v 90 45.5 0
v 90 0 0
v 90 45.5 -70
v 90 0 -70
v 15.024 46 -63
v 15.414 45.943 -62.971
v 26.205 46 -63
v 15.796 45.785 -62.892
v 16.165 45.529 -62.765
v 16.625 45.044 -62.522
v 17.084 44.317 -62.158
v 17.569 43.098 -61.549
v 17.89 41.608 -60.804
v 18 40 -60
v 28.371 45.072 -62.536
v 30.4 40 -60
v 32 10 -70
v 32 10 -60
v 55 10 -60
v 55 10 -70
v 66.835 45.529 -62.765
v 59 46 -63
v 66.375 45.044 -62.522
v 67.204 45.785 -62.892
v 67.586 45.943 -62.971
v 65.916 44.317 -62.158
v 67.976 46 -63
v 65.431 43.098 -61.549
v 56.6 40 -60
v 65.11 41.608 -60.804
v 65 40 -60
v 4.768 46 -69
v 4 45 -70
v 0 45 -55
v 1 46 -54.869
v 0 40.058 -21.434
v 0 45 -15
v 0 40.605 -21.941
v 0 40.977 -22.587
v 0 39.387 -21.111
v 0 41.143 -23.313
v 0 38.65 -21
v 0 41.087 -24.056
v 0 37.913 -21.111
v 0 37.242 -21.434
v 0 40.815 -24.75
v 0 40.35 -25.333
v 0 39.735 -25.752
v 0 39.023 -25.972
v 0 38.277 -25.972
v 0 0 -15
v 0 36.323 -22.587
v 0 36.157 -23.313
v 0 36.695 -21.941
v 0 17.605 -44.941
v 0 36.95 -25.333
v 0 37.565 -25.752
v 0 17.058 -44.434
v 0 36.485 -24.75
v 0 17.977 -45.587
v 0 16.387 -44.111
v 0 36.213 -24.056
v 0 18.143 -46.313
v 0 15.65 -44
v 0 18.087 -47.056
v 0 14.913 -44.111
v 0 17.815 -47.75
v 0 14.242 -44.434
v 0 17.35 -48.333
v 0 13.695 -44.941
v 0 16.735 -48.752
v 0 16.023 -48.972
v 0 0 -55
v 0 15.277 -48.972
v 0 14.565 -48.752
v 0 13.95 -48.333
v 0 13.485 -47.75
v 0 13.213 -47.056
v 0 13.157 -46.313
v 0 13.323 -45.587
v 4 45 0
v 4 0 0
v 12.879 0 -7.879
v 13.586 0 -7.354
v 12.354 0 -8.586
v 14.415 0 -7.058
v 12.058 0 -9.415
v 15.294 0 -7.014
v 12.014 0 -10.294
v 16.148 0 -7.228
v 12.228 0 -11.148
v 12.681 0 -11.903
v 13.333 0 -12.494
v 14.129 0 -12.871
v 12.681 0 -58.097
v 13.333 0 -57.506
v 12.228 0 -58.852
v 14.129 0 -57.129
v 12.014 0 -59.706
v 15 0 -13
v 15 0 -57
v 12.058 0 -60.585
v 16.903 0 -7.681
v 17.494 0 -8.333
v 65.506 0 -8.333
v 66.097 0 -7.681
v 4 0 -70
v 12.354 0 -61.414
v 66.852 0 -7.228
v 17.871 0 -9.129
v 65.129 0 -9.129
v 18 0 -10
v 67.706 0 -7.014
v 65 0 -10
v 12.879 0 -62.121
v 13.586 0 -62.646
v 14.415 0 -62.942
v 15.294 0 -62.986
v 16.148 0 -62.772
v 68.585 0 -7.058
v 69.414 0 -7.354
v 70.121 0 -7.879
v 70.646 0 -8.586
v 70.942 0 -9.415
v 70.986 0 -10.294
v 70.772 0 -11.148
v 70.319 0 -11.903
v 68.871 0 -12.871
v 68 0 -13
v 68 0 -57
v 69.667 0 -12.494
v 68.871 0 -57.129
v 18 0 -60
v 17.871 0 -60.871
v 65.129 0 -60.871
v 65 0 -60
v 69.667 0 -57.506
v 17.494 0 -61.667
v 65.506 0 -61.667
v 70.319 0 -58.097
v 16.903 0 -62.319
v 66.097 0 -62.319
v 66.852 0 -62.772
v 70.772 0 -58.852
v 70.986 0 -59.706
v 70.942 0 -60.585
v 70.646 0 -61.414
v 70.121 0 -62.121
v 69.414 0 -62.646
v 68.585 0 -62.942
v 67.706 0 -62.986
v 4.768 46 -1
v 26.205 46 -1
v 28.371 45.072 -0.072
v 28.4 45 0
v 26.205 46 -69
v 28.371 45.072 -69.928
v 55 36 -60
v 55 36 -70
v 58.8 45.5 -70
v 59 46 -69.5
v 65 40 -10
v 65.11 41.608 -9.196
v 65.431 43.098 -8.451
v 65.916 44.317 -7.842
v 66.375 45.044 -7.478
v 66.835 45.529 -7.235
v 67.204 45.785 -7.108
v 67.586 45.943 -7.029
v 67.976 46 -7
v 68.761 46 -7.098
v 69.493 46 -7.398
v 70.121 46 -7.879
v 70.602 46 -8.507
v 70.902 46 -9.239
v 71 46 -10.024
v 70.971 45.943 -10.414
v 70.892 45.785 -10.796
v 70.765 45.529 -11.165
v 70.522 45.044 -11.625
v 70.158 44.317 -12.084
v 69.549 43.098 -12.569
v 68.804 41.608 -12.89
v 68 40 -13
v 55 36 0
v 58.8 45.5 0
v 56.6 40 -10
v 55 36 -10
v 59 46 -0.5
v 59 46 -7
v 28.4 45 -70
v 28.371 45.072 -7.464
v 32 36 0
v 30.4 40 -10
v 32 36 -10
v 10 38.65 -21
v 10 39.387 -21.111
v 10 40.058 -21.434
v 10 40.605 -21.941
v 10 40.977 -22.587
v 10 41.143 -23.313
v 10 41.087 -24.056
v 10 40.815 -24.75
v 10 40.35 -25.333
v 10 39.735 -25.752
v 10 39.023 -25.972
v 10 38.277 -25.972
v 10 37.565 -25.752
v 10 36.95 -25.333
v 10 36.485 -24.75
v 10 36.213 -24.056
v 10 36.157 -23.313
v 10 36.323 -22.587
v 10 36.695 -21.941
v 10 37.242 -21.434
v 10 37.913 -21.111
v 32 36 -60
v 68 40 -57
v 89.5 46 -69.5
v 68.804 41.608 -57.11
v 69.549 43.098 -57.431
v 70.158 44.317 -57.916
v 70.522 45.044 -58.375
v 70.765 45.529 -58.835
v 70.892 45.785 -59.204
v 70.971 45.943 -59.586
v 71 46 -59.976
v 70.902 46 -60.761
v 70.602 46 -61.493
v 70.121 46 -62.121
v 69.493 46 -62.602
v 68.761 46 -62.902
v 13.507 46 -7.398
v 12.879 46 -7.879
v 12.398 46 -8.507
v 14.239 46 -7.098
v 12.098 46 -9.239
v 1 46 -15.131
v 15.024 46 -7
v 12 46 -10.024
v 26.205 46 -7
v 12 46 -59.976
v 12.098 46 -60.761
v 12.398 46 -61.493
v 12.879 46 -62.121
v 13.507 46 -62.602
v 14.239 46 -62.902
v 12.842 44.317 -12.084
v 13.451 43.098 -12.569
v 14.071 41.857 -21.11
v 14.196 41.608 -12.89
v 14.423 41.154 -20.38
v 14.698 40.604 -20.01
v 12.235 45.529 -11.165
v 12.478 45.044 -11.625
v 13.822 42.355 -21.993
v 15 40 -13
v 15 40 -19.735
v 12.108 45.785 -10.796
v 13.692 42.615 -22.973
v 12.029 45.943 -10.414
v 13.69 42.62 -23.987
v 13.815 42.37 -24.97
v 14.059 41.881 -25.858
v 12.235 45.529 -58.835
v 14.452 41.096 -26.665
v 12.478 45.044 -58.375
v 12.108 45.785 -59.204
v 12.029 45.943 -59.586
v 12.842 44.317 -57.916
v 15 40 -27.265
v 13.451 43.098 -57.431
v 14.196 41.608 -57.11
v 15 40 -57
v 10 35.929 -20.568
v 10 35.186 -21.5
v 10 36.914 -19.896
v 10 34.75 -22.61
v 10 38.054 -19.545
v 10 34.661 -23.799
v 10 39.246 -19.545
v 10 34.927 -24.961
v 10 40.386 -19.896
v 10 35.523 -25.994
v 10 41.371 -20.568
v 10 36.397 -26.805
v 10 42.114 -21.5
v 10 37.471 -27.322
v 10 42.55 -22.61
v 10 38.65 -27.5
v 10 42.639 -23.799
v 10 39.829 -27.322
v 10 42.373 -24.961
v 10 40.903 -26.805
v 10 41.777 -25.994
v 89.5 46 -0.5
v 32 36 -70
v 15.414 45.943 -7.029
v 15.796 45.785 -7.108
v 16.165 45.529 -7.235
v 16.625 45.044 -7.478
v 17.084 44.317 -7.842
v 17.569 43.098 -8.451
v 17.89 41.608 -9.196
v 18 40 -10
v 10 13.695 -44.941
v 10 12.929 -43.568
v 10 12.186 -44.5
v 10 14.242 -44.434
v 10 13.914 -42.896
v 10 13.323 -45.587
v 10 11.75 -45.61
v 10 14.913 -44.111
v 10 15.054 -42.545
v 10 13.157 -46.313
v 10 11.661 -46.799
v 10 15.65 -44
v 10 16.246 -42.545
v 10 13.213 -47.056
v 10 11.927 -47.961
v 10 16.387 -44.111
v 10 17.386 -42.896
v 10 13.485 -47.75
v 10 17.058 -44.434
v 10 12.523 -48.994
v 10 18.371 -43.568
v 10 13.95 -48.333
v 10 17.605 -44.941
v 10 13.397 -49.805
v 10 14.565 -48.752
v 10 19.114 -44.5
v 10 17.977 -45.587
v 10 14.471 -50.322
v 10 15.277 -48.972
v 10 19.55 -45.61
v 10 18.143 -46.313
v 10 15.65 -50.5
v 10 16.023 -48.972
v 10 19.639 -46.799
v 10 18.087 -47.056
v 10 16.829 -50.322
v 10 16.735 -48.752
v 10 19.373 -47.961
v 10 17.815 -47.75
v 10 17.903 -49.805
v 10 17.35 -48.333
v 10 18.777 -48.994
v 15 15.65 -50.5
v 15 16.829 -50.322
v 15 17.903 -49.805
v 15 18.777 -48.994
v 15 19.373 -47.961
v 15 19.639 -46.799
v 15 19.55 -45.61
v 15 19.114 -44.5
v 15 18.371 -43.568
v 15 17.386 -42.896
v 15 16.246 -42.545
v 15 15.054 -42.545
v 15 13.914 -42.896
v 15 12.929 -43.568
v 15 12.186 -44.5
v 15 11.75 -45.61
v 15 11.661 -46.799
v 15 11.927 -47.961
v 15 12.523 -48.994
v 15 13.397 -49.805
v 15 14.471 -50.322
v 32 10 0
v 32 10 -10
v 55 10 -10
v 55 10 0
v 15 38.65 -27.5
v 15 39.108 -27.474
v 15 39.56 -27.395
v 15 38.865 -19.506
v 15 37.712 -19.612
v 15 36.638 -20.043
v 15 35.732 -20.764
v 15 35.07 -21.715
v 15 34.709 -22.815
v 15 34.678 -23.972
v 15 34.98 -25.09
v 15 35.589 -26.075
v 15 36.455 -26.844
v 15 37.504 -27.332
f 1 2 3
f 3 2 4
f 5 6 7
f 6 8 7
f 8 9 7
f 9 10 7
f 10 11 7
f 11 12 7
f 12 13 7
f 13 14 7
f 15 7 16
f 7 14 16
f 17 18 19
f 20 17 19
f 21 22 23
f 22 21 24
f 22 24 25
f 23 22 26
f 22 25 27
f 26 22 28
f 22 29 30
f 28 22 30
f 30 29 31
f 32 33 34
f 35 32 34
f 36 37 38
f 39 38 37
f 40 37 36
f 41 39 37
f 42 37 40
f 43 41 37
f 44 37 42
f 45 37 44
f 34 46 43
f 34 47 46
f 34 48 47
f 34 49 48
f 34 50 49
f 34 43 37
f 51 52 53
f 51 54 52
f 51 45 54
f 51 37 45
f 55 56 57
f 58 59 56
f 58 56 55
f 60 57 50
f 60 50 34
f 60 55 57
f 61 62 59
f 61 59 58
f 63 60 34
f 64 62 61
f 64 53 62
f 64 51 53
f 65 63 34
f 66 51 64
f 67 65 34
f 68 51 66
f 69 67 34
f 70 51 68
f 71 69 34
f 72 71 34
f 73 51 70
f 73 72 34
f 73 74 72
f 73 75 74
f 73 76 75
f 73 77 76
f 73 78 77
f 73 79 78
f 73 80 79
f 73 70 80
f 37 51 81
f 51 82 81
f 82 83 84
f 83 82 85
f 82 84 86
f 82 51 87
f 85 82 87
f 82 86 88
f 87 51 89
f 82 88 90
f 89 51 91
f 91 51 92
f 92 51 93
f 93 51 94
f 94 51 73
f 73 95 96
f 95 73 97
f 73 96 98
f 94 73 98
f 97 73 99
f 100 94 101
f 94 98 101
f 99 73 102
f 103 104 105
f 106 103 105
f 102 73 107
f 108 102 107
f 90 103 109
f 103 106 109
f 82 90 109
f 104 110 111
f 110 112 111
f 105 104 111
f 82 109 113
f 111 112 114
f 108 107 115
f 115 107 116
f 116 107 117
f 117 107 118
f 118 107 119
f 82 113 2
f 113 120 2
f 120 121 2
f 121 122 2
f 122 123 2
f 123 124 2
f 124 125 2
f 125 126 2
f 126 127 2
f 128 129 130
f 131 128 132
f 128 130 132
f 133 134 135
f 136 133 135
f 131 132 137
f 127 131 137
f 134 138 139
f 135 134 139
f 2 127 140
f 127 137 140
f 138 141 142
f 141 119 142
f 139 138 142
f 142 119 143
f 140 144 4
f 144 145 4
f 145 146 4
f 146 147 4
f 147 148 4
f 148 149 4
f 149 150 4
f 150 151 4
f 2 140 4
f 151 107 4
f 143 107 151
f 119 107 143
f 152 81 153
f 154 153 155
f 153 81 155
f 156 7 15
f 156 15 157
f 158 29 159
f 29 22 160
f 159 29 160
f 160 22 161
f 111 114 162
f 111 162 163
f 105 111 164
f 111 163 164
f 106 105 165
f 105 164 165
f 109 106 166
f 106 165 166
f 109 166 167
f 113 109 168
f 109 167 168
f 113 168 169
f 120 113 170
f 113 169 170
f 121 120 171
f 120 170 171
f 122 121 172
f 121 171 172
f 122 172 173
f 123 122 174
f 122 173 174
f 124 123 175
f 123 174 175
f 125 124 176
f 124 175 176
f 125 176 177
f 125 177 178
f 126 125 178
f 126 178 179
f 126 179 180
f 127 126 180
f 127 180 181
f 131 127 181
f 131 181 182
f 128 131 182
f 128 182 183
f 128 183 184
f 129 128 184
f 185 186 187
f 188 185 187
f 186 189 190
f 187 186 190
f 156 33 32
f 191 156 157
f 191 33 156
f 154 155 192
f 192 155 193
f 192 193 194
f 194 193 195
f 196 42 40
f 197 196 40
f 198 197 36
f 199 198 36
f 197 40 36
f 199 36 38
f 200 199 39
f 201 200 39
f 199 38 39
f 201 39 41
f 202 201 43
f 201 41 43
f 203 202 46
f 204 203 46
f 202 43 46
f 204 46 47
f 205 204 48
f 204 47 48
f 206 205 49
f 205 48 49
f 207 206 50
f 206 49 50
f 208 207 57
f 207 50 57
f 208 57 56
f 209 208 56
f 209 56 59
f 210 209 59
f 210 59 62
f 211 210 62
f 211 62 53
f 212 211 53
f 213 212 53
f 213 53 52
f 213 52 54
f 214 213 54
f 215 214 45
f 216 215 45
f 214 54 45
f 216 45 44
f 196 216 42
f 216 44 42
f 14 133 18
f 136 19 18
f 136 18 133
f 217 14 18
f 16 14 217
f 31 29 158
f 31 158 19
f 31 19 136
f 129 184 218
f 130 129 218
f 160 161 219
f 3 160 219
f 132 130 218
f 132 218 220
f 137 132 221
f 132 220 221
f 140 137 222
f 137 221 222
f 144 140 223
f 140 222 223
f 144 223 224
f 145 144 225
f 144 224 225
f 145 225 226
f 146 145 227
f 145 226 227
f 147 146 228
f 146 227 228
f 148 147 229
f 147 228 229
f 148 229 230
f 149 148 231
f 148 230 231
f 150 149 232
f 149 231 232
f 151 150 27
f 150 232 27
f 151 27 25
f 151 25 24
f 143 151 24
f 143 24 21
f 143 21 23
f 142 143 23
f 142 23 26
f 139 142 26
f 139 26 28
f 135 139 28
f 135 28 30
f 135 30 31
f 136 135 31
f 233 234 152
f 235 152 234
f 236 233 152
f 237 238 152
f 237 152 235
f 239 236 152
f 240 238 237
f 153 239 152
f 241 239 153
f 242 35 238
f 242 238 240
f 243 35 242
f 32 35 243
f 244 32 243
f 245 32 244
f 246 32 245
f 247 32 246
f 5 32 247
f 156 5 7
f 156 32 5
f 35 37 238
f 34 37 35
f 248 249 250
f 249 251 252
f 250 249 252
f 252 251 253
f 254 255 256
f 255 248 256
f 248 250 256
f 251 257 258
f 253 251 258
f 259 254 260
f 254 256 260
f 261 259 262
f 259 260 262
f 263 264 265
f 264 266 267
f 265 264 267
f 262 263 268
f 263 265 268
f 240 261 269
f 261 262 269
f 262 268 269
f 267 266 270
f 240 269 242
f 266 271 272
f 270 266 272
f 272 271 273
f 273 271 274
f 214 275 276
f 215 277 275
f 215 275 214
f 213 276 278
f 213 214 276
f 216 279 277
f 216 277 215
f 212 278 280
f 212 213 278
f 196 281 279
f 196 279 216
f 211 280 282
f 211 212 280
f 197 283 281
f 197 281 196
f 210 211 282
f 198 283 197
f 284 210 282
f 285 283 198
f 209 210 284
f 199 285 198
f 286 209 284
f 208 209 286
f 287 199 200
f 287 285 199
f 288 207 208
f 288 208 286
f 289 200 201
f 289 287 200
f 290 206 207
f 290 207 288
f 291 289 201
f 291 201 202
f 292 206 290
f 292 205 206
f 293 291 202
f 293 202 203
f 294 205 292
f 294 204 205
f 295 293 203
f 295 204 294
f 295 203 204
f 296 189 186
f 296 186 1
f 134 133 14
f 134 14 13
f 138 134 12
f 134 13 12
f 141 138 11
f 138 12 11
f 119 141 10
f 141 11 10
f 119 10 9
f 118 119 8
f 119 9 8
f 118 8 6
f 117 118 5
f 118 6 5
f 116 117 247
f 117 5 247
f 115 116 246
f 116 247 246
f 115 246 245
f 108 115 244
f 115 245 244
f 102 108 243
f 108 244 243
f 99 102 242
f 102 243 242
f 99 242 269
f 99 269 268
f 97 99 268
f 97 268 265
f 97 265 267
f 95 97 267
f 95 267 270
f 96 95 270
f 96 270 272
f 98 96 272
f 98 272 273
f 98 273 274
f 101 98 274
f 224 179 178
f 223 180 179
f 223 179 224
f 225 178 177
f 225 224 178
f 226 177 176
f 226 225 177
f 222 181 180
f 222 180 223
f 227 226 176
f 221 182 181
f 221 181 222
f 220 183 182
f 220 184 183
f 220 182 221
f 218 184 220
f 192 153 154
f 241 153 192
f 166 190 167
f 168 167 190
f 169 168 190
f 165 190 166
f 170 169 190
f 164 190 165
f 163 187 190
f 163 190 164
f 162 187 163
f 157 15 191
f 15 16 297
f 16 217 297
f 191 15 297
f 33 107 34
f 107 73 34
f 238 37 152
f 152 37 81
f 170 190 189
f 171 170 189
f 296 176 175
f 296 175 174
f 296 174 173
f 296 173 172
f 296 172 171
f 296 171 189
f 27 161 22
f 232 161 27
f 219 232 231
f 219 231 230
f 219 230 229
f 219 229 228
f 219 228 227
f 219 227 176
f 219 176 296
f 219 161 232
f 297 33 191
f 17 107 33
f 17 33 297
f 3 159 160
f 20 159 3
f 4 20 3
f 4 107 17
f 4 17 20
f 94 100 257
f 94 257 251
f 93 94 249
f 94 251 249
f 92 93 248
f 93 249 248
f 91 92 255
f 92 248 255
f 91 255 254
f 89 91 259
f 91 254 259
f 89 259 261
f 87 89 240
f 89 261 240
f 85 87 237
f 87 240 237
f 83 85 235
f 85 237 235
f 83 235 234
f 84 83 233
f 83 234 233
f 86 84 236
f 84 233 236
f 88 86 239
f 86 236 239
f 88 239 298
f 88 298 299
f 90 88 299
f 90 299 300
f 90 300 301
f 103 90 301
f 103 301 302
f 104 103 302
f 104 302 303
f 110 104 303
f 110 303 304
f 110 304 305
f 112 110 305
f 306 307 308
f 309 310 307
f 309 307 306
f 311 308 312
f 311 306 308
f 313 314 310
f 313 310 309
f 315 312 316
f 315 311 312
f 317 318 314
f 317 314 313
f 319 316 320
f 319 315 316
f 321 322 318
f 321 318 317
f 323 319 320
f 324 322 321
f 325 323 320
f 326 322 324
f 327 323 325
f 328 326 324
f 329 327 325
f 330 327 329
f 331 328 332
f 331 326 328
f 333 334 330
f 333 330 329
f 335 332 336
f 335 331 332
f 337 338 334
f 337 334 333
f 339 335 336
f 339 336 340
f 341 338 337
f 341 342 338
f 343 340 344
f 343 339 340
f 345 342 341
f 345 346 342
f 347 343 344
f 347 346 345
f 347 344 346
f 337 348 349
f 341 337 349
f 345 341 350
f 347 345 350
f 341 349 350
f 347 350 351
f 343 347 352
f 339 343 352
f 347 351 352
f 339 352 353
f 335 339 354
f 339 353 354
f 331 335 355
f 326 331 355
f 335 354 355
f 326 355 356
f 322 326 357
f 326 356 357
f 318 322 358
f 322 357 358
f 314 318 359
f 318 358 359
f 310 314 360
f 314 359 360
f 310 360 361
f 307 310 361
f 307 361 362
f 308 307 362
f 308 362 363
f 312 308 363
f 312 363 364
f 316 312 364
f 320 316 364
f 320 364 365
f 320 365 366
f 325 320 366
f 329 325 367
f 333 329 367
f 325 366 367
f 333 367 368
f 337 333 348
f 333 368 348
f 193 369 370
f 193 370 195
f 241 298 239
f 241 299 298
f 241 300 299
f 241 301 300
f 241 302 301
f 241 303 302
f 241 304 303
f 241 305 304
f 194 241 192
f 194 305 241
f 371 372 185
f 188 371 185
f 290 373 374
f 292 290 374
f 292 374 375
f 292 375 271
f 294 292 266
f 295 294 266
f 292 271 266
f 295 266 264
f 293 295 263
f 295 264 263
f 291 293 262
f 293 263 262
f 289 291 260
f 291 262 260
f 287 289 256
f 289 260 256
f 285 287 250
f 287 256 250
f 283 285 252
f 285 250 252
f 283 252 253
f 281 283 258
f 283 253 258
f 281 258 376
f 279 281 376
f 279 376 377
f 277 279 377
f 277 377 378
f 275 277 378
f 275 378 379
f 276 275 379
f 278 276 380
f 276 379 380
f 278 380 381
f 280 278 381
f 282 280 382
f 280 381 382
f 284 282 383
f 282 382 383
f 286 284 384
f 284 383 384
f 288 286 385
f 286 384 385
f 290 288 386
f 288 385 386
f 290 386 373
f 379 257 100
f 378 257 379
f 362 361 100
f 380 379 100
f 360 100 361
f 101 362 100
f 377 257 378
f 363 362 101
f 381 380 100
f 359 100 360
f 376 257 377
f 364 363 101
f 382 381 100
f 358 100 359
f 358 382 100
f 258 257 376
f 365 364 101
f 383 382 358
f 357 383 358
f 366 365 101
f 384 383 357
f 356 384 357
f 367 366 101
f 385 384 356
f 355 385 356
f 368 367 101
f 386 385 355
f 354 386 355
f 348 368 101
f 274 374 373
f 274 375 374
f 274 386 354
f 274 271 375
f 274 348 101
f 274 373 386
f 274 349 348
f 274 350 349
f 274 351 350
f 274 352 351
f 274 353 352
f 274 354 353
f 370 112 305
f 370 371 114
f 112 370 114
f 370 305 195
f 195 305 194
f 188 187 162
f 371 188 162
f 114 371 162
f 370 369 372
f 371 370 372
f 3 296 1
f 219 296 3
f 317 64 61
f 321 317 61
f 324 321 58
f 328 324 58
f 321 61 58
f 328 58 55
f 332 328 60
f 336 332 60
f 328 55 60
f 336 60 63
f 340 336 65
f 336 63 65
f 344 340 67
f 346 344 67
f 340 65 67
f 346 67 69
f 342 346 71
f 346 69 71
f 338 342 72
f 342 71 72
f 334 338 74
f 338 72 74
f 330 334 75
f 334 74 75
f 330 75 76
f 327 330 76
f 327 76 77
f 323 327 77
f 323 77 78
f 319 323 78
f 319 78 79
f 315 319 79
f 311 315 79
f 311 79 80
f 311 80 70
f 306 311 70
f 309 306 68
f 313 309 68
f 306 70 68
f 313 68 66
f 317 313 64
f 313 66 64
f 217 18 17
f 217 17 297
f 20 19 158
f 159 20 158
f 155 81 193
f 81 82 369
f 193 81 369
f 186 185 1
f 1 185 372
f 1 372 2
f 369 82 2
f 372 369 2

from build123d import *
from OCP.BRepFilletAPI import BRepFilletAPI_MakeChamfer

# Parameters (mm, degrees)
SKETCH1_W           = 90
SKETCH1_H           = 70
BOSS_EXTRUDE1_DEPTH = 46
SKETCH2_W           = 53
SKETCH2_H           = 50
CUT_EXTRUDE1_DEPTH  = 123.947143114
SKETCH3_R           = 3
CUT_EXTRUDE2_DEPTH  = 123.947143114
SKETCH4_W           = 23
SKETCH4_H           = 36
CUT_EXTRUDE3_DEPTH  = 123.947143114
CHAMFER1_SIZE       = 10
CHAMFER1_SIZE2      = 4
CHAMFER2_SIZE       = 4
CHAMFER2_SIZE2      = 10
CHAMFER3_SIZE       = 3
CHAMFER3_SIZE_2     = 6
CHAMFER4_SIZE       = 4
CHAMFER4_SIZE2      = 15
CHAMFER5_SIZE       = 15
CHAMFER5_SIZE2      = 4
CHAMFER6_SIZE       = 1
CHAMFER6_SIZE2      = 1.795054936
CHAMFER7_SIZE       = 0.5
SKETCH5_R           = 2.5
CUT_EXTRUDE4_DEPTH  = 10
SKETCH7_R           = 4
CUT_EXTRUDE5_DEPTH  = 5


with BuildPart() as part:
    # Sketch1 → Boss-Extrude1 (new body)
    with BuildSketch(Plane(origin=(0, 0, 0), x_dir=(1, 0, 0), z_dir=(0, 1, 0))):
        with Locations((45, 35)):
            Rectangle(SKETCH1_W, SKETCH1_H)
    extrude(amount=BOSS_EXTRUDE1_DEPTH)

    # Sketch2 → Cut-Extrude1 (cut, through all)
    with BuildSketch(Plane(origin=(0, 46, 0), x_dir=(1, 0, 0), z_dir=(0, 1, 0))):
        with Locations((41.5, 35)):
            Rectangle(SKETCH2_W, SKETCH2_H)
    extrude(amount=-CUT_EXTRUDE1_DEPTH, mode=Mode.SUBTRACT)

    # Sketch3 → Cut-Extrude2 (cut, through all)
    with BuildSketch(Plane(origin=(0, 46, 0), x_dir=(1, 0, 0), z_dir=(0, 1, 0))):
        with Locations((15, 60)):
            Circle(SKETCH3_R)
        with Locations((68, 60)):
            Circle(SKETCH3_R)
        with Locations((68, 10)):
            Circle(SKETCH3_R)
        with Locations((15, 10)):
            Circle(SKETCH3_R)
    extrude(amount=-CUT_EXTRUDE2_DEPTH, mode=Mode.SUBTRACT)

    # Sketch4 → Cut-Extrude3 (cut, through all)
    with BuildSketch(Plane.XY):
        with Locations((43.5, 28)):
            Rectangle(SKETCH4_W, SKETCH4_H)
    extrude(amount=-CUT_EXTRUDE3_DEPTH, mode=Mode.SUBTRACT)

    # Chamfer1: one chamfer whose edges measure the first distance from different faces: ONE call of the kernel's chamfer builder (chamfer() names one face for all edges)
    chamfer1_edges_1 = [part.edges().sort_by_distance(p)[0] for p in [
        (55, 46, -65),
    ]]
    chamfer1_side_1 = [part.faces().sort_by_distance(p)[0] for p in [
        (55, 28, -65),
    ]]
    chamfer1_edges_2 = [part.edges().sort_by_distance(p)[0] for p in [
        (55, 46, -5),
    ]]
    chamfer1_side_2 = [part.faces().sort_by_distance(p)[0] for p in [
        (55, 28, -5),
    ]]
    chamfer1 = BRepFilletAPI_MakeChamfer(part.part.solid().wrapped)
    for e in chamfer1_edges_1:
        chamfer1.Add(CHAMFER1_SIZE, CHAMFER1_SIZE2, e.wrapped, chamfer1_side_1[0].wrapped)  # the first distance lies on this face
    for e in chamfer1_edges_2:
        chamfer1.Add(CHAMFER1_SIZE, CHAMFER1_SIZE2, e.wrapped, chamfer1_side_2[0].wrapped)  # the first distance lies on this face
    add(Compound.cast(chamfer1.Shape()), mode=Mode.REPLACE)

    # Chamfer2
    chamfer2_edges = [part.edges().sort_by_distance(p)[0] for p in [
        (32, 46, -65),
        (32, 46, -5),
    ]]
    chamfer2_side = [part.faces().sort_by_distance(p)[0] for p in [
        (11.31415673, 46, -35),
    ]]
    chamfer(chamfer2_edges, length=CHAMFER2_SIZE, length2=CHAMFER2_SIZE2, reference=chamfer2_side[0])

    # Chamfer3
    chamfer3_edges_1 = [part.edges().sort_by_distance(p)[0] for p in [
        (62, 46, -10),
    ]]
    chamfer3_side_1 = [part.faces().sort_by_distance(p)[0] for p in [
        (62, 46, -9.94),
    ]]
    chamfer3_edges_2 = [part.edges().sort_by_distance(p)[0] for p in [
        (68, 46, -35),
    ]]
    chamfer3_side_2 = [part.faces().sort_by_distance(p)[0] for p in [
        (68.06, 46, -35),
    ]]
    chamfer3_edges_3 = [part.edges().sort_by_distance(p)[0] for p in [
        (62, 46, -60),
    ]]
    chamfer3_side_3 = [part.faces().sort_by_distance(p)[0] for p in [
        (62, 46, -60.06),
    ]]
    chamfer3_edges_4 = [part.edges().sort_by_distance(p)[0] for p in [
        (23, 46, -60),
    ]]
    chamfer3_side_4 = [part.faces().sort_by_distance(p)[0] for p in [
        (23, 46, -60.06),
    ]]
    chamfer3_edges_5 = [part.edges().sort_by_distance(p)[0] for p in [
        (23, 46, -10),
    ]]
    chamfer3_side_5 = [part.faces().sort_by_distance(p)[0] for p in [
        (23, 46, -9.94),
    ]]
    chamfer3_edges_6 = [part.edges().sort_by_distance(p)[0] for p in [
        (15, 46, -35),
    ]]
    chamfer3_side_6 = [part.faces().sort_by_distance(p)[0] for p in [
        (14.94, 46, -35),
    ]]
    chamfer3 = BRepFilletAPI_MakeChamfer(part.part.solid().wrapped)
    for e in chamfer3_edges_1:
        chamfer3.Add(CHAMFER3_SIZE - 0.0001, CHAMFER3_SIZE_2 - 0.0001, e.wrapped, chamfer3_side_1[0].wrapped)
    for e in chamfer3_edges_2:
        chamfer3.Add(CHAMFER3_SIZE - 0.0001, CHAMFER3_SIZE_2 - 0.0001, e.wrapped, chamfer3_side_2[0].wrapped)
    for e in chamfer3_edges_3:
        chamfer3.Add(CHAMFER3_SIZE - 0.0001, CHAMFER3_SIZE_2 - 0.0001, e.wrapped, chamfer3_side_3[0].wrapped)
    for e in chamfer3_edges_4:
        chamfer3.Add(CHAMFER3_SIZE - 0.0001, CHAMFER3_SIZE_2 - 0.0001, e.wrapped, chamfer3_side_4[0].wrapped)
    for e in chamfer3_edges_5:
        chamfer3.Add(CHAMFER3_SIZE - 0.0001, CHAMFER3_SIZE_2 - 0.0001, e.wrapped, chamfer3_side_5[0].wrapped)
    for e in chamfer3_edges_6:
        chamfer3.Add(CHAMFER3_SIZE - 0.0001, CHAMFER3_SIZE_2 - 0.0001, e.wrapped, chamfer3_side_6[0].wrapped)
    add(Compound.cast(chamfer3.Shape()), mode=Mode.REPLACE)  # a hair under: the kernel refuses the full size

    # Chamfer4
    chamfer4_edges = [part.edges().sort_by_distance(p)[0] for p in [
        (0, 23, -70),
    ]]
    chamfer4_side = [part.faces().sort_by_distance(p)[0] for p in [
        (30.989257699, 23, -70),
    ]]
    chamfer(chamfer4_edges, length=CHAMFER4_SIZE, length2=CHAMFER4_SIZE2, reference=chamfer4_side[0])

    # Chamfer5
    chamfer5_edges = [part.edges().sort_by_distance(p)[0] for p in [
        (0, 23, 0),
    ]]
    chamfer5_side = [part.faces().sort_by_distance(p)[0] for p in [
        (0, 23, -27.5),
    ]]
    chamfer(chamfer5_edges, length=CHAMFER5_SIZE, length2=CHAMFER5_SIZE2, reference=chamfer5_side[0])

    # Chamfer6: one chamfer whose edges measure the first distance from different faces: ONE call of the kernel's chamfer builder (chamfer() names one face for all edges)
    chamfer6_edges_1 = [part.edges().sort_by_distance(p)[0] for p in [
        (16, 46, -70),
        (0, 46, -35),
        (2, 46, -62.5),
        (16, 46, 0),
        (2, 46, -7.5),
    ]]
    chamfer6_edges_2 = [part.edges().sort_by_distance(p)[0] for p in [
        (28, 46, -3.50005),
    ]]
    chamfer6_side_2 = [part.faces().sort_by_distance(p)[0] for p in [
        (30.118676116, 40.703309709, -4.604414044),
    ]]
    chamfer6_edges_3 = [part.edges().sort_by_distance(p)[0] for p in [
        (28, 46, -66.49995),
    ]]
    chamfer6_side_3 = [part.faces().sort_by_distance(p)[0] for p in [
        (30.118676116, 40.703309709, -65.395585956),
    ]]
    chamfer6 = BRepFilletAPI_MakeChamfer(part.part.solid().wrapped)
    for e in chamfer6_edges_1:
        chamfer6.Add(CHAMFER6_SIZE, e.wrapped)
    for e in chamfer6_edges_2:
        chamfer6.Add(CHAMFER6_SIZE, CHAMFER6_SIZE2, e.wrapped, chamfer6_side_2[0].wrapped)  # the first distance lies on this face
    for e in chamfer6_edges_3:
        chamfer6.Add(CHAMFER6_SIZE, CHAMFER6_SIZE2, e.wrapped, chamfer6_side_3[0].wrapped)  # the first distance lies on this face
    add(Compound.cast(chamfer6.Shape()), mode=Mode.REPLACE)

    # Chamfer7
    chamfer7_edges = [part.edges().sort_by_distance(p)[0] for p in [
        (74.5, 46, 0),
        (90, 46, -35),
        (74.5, 46, -70),
    ]]
    chamfer(chamfer7_edges, length=CHAMFER7_SIZE)

    # Sketch5 → Cut-Extrude4 (cut)
    with BuildSketch(Plane.ZY):
        with Locations((-23.5, 38.65)):
            Circle(SKETCH5_R)
        with Locations((-46.5, 15.65)):
            Circle(SKETCH5_R)
    extrude(amount=-CUT_EXTRUDE4_DEPTH, mode=Mode.SUBTRACT)

    # Sketch7 → Cut-Extrude5 (cut)
    with BuildSketch(Plane(origin=(15, 0, 0), x_dir=(0, 0, -1), z_dir=(1, 0, 0))):
        with Locations((23.5, 38.65)):
            Circle(SKETCH7_R)
        with Locations((46.5, 15.65)):
            Circle(SKETCH7_R)
    extrude(amount=-CUT_EXTRUDE5_DEPTH, mode=Mode.SUBTRACT)


solid = part.part
